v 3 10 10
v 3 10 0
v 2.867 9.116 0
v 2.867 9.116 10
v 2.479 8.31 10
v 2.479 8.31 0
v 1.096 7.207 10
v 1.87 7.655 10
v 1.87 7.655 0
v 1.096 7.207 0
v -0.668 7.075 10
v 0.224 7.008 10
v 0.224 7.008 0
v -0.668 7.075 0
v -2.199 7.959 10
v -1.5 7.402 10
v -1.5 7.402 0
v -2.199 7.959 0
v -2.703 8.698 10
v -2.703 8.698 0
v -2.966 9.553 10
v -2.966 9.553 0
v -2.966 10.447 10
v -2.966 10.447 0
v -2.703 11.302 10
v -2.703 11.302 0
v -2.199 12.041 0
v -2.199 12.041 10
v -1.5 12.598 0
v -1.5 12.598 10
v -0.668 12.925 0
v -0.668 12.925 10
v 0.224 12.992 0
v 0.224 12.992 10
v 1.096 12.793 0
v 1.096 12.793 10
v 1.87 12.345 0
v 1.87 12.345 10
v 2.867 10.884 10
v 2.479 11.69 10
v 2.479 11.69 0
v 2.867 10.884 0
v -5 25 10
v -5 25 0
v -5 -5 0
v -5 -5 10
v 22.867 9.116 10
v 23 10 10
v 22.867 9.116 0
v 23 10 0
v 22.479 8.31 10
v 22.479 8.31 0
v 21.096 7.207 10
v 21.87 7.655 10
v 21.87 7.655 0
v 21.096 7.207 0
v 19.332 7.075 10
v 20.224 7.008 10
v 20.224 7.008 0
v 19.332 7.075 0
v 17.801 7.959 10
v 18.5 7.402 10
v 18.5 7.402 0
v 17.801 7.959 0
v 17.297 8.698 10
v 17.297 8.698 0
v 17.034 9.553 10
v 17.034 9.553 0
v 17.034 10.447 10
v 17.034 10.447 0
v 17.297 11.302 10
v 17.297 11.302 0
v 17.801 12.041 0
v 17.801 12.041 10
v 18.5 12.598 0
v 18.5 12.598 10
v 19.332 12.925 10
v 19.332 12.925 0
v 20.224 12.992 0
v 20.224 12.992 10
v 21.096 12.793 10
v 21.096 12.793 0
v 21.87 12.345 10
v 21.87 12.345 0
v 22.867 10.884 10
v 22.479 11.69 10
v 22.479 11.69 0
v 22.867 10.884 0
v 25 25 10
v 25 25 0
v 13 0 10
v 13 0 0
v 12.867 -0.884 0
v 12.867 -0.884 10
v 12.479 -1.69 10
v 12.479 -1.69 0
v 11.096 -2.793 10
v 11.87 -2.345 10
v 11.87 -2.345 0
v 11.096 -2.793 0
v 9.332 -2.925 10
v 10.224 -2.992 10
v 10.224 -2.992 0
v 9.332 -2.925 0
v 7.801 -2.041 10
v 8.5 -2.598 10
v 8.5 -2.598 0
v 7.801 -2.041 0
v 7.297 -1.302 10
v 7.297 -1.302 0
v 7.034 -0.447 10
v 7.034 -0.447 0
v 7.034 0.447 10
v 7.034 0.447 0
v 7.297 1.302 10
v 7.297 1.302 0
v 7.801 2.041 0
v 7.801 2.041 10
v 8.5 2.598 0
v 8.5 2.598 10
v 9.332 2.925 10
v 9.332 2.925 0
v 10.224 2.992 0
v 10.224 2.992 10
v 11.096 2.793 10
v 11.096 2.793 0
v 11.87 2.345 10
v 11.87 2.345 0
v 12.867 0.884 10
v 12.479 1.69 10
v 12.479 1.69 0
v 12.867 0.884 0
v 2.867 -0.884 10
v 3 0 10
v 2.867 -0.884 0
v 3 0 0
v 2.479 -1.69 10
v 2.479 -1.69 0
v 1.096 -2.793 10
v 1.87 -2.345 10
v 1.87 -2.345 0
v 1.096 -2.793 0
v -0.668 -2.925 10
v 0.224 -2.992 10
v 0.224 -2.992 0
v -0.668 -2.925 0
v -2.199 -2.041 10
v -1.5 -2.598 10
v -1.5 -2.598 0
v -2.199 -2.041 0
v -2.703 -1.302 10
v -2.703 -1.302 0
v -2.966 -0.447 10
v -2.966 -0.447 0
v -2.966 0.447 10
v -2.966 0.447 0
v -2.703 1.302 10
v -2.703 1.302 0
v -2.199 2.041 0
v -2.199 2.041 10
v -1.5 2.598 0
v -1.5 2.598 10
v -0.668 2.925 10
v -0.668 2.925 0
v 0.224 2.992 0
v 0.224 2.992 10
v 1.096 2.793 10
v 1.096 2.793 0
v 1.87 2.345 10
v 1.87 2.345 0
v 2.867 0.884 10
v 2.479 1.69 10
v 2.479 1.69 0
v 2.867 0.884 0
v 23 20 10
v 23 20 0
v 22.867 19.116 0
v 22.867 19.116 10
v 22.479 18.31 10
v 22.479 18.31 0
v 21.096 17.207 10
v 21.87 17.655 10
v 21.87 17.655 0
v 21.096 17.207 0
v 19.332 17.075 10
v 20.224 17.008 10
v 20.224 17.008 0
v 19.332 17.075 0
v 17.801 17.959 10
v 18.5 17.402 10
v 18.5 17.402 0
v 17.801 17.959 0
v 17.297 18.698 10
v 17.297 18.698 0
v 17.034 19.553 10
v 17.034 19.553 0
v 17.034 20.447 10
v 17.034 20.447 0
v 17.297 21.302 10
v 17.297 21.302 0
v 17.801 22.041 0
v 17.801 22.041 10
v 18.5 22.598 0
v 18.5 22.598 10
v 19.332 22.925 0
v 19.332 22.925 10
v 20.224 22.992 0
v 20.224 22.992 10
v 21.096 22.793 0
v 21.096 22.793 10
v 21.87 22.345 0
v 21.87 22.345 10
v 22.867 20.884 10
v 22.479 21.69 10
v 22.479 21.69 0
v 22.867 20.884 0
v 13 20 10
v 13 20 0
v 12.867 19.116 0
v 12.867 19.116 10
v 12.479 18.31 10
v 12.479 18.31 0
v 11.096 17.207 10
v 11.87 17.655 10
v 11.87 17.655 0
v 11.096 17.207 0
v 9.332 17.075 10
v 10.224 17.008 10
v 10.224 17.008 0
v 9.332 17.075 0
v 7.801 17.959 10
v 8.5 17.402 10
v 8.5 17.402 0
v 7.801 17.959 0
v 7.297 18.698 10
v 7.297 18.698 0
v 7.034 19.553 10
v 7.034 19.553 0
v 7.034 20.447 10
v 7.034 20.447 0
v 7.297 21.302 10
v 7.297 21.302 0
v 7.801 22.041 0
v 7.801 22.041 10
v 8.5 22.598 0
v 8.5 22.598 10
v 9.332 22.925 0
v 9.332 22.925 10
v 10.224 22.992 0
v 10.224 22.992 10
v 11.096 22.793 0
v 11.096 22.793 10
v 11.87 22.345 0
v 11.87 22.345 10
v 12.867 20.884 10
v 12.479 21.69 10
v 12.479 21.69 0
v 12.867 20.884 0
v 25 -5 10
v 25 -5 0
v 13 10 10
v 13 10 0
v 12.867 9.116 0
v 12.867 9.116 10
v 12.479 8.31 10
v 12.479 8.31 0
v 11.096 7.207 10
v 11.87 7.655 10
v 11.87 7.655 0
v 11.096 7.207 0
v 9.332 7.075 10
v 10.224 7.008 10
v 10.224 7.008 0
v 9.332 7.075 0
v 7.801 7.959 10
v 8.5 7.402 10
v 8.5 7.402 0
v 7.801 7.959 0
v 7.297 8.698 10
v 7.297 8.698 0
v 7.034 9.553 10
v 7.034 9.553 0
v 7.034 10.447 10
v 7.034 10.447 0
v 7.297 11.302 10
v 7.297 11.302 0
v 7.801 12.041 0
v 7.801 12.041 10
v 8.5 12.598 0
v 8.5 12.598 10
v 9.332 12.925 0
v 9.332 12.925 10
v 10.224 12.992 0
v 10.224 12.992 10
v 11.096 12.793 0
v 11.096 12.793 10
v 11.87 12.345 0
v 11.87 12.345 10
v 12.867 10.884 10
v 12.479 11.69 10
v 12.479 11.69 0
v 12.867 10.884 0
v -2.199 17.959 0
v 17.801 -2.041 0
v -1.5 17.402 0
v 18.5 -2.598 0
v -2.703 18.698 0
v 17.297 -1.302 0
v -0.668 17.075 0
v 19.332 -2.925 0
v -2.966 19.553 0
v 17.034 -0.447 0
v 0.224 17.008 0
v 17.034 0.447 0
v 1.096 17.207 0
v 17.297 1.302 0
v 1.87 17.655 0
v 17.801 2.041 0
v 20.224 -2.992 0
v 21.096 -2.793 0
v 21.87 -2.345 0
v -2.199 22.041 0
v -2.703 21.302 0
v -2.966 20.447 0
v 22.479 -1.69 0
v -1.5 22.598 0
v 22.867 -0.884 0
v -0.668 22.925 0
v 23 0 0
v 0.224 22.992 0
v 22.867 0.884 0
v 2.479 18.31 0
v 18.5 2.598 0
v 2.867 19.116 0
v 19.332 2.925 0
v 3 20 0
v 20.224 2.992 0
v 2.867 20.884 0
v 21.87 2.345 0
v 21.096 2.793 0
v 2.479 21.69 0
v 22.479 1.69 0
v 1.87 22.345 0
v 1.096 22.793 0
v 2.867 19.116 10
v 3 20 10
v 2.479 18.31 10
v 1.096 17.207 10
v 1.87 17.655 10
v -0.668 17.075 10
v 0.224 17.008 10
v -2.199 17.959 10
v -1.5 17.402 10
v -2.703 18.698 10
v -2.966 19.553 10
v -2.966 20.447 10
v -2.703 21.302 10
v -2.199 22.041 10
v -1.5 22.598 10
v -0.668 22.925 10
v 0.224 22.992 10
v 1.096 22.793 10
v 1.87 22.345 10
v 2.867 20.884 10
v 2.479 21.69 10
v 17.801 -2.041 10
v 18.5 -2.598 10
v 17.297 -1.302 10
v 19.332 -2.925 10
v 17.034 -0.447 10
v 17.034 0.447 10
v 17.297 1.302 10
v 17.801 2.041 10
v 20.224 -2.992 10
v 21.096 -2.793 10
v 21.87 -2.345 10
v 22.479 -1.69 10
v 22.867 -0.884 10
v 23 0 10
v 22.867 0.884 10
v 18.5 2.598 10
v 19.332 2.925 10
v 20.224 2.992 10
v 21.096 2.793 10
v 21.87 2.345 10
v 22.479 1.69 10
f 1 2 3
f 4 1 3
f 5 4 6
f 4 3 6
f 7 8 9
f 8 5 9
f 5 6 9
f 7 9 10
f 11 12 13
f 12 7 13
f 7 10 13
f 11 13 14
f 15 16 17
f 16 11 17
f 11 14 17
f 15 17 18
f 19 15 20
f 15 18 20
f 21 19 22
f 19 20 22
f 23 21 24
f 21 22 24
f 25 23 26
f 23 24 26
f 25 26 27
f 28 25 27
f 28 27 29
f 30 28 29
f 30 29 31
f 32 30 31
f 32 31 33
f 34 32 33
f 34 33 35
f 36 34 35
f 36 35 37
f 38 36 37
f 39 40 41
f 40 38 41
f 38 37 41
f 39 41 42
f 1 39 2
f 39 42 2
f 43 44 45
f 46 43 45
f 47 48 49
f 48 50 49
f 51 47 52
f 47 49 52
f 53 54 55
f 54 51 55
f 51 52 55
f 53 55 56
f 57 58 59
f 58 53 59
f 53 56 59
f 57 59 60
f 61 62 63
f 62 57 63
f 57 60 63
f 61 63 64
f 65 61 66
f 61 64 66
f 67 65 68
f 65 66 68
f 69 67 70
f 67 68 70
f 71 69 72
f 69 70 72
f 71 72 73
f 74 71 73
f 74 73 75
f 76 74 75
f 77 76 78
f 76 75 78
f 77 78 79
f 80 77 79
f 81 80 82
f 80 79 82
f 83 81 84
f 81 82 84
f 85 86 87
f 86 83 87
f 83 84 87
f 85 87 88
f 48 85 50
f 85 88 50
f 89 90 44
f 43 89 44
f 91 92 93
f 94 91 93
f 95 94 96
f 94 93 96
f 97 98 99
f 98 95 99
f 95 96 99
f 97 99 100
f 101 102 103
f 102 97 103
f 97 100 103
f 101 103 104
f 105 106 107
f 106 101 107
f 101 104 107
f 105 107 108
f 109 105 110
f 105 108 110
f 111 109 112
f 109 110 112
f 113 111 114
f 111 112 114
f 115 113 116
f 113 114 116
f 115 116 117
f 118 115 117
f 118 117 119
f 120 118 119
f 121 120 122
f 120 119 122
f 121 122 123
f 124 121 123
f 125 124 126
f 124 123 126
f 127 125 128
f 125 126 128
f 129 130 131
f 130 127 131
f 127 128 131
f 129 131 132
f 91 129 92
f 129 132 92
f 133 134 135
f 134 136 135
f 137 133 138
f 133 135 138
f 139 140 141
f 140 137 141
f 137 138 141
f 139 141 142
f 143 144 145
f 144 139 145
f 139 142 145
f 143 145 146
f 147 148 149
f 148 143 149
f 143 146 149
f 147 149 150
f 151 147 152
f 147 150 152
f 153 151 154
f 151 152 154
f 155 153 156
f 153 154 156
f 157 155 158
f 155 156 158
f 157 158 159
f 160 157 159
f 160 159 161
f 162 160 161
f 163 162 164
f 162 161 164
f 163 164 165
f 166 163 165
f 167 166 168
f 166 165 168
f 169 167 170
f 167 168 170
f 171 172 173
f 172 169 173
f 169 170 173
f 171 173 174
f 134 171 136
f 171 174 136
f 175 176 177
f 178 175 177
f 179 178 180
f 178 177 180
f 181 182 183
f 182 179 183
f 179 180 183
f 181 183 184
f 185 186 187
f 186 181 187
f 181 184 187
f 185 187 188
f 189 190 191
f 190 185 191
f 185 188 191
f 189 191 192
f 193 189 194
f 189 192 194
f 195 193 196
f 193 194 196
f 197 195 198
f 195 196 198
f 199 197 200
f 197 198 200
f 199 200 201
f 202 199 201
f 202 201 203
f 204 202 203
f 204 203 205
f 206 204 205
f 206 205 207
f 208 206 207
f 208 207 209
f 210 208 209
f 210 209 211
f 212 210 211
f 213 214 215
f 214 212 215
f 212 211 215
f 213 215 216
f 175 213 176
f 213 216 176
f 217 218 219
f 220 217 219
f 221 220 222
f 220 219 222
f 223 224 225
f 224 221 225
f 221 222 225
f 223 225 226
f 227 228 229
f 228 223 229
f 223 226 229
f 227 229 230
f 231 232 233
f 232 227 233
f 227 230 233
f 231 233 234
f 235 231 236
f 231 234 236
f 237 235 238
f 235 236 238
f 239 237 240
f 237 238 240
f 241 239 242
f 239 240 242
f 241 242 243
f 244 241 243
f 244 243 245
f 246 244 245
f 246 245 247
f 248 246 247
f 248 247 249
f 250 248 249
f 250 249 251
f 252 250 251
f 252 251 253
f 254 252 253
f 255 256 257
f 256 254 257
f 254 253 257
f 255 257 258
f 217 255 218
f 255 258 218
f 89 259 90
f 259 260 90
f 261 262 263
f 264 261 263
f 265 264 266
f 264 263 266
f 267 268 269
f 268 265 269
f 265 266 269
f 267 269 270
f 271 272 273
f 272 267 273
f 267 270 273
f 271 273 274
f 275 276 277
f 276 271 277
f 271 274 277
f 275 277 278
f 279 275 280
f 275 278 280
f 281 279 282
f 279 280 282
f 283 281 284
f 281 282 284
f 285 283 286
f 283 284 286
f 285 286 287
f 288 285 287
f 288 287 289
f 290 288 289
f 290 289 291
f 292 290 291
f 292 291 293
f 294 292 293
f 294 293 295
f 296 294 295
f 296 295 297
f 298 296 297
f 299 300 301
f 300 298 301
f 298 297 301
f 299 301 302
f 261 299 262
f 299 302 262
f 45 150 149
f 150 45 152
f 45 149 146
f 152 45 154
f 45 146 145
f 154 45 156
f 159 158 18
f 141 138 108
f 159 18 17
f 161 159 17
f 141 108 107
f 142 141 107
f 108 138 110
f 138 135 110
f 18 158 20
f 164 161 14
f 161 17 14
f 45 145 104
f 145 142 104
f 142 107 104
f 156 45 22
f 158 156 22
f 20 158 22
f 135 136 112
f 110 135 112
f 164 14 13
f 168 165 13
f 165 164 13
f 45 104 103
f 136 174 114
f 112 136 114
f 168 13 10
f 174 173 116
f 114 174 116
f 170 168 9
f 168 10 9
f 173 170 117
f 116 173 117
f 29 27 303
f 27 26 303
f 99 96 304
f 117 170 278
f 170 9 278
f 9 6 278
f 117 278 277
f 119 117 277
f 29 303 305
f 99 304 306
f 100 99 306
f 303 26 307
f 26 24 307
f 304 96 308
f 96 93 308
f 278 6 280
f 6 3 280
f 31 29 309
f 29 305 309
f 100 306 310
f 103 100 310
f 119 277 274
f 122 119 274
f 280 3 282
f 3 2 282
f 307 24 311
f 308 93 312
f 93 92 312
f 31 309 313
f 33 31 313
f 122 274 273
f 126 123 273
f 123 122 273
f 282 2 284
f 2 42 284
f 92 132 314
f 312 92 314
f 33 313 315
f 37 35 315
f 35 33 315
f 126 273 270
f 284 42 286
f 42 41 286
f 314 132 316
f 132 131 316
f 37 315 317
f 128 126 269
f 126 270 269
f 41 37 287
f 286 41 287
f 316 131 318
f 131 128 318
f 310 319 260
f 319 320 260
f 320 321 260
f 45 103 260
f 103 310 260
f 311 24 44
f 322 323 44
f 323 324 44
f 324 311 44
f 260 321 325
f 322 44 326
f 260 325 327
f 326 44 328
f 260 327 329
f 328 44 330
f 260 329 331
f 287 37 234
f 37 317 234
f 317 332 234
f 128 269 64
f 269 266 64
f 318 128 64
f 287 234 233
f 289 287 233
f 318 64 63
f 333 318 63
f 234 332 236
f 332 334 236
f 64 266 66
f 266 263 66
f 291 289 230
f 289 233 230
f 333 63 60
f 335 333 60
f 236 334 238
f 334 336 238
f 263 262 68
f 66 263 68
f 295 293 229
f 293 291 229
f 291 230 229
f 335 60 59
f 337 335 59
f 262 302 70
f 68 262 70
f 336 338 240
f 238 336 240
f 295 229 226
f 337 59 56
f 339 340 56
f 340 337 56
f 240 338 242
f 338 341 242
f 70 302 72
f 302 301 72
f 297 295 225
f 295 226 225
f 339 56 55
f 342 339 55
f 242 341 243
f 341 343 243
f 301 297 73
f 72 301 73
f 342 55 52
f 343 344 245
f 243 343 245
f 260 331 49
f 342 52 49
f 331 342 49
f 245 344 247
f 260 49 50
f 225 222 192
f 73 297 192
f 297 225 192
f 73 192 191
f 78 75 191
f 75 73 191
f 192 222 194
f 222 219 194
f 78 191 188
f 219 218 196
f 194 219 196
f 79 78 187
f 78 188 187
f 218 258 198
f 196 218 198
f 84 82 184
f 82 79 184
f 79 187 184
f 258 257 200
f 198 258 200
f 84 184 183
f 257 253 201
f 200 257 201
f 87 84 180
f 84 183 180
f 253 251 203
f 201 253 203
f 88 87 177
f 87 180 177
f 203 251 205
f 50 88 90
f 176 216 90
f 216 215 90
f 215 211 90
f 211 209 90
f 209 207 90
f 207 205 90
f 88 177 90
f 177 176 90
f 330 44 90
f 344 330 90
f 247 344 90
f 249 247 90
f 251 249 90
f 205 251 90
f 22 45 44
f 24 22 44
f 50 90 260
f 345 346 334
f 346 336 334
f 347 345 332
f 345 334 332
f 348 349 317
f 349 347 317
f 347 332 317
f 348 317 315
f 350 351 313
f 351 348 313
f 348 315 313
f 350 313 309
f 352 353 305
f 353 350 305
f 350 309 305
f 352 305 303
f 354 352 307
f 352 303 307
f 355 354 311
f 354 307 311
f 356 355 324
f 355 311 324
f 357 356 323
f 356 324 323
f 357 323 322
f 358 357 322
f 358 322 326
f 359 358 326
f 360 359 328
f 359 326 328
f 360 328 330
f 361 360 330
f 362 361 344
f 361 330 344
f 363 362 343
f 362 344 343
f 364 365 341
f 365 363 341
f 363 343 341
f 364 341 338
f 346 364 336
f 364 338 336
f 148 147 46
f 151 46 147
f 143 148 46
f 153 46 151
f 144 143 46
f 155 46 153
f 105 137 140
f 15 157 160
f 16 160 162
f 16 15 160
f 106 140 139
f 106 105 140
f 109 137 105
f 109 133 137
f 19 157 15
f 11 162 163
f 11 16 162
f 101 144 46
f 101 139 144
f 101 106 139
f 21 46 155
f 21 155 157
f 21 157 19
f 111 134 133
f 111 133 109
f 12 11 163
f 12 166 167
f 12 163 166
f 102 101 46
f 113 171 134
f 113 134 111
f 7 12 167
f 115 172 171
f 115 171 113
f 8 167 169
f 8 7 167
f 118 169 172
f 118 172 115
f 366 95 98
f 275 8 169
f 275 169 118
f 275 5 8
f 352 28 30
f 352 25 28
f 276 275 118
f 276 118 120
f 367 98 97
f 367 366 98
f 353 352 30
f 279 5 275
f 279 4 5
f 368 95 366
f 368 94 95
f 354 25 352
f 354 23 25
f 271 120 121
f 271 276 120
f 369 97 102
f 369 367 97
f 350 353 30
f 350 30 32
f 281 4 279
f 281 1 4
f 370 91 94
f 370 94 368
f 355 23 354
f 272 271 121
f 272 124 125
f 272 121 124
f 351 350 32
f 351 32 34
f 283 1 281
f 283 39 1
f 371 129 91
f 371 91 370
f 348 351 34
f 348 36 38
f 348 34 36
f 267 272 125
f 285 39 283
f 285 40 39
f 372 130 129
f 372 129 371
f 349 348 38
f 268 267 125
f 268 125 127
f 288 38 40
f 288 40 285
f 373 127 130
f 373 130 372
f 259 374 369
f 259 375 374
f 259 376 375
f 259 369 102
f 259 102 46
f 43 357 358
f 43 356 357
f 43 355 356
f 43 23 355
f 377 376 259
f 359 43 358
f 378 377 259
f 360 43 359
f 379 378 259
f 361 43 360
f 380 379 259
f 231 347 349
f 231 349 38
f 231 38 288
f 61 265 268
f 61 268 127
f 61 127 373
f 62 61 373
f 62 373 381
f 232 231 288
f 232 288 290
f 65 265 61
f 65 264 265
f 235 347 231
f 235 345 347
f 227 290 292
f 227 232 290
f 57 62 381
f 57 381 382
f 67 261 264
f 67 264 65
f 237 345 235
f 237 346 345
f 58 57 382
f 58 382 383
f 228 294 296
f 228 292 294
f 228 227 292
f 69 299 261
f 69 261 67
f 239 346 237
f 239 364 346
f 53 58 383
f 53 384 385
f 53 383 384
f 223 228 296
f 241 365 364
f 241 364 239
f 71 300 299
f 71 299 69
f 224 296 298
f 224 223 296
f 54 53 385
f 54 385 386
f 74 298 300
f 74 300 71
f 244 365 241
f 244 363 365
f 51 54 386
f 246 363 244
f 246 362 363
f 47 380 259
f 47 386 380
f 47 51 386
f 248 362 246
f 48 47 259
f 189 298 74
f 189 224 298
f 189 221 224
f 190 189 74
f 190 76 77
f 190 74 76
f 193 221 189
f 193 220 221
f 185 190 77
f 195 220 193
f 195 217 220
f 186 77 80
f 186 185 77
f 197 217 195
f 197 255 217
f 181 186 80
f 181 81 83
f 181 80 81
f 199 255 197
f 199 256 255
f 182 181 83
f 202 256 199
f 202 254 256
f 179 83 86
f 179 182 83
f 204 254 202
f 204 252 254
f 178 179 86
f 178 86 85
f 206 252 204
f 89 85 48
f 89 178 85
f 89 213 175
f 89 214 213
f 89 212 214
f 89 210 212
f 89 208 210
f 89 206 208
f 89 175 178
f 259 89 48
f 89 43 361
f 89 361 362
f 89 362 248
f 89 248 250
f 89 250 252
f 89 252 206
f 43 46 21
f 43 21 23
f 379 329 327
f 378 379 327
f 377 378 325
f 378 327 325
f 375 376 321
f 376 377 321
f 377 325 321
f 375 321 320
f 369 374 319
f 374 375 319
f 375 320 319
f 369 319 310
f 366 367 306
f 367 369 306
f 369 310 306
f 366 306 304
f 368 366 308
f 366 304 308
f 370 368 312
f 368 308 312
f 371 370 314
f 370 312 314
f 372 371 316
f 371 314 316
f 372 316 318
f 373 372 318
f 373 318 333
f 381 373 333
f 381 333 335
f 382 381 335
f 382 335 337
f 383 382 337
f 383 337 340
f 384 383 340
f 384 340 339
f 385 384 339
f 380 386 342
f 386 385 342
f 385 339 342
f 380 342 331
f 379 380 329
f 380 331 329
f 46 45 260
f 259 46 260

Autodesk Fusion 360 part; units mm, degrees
sketch "Sketch1" plane through (0, 0, 0) normal (0, 0, 1) x (1, 0, 0)
  circle A0 centre (0, 0) radius 3
  circle A1 centre (10, 0) radius 3
  circle A2 centre (20, 0) radius 3
  circle A3 centre (0, 10) radius 3
  circle A4 centre (20, 10) radius 3
  circle A5 centre (10, 10) radius 3
  circle A6 centre (0, 20) radius 3
  circle A7 centre (20, 20) radius 3
  circle A8 centre (10, 20) radius 3
  line L0 (25, 25) -> (-5, 25)
  line L1 (-5, 25) -> (-5, -5)
  line L2 (-5, -5) -> (25, -5)
  line L3 (25, -5) -> (25, 25)
  line L4 (25, 25) -> (-5, -5) construction
  line L5 (-5, 25) -> (25, -5) construction
  point P0 (10, 10)
  dimension "d1" = 6
  dimension "d4" = 20
  dimension "d5" = 0
  dimension "d8" = 0
  dimension "d9" = 20
  dimension "d10" = 30
  dimension "d11" = 30
extrude "Extrude1" add sketch "Sketch1" along normal blind 10
